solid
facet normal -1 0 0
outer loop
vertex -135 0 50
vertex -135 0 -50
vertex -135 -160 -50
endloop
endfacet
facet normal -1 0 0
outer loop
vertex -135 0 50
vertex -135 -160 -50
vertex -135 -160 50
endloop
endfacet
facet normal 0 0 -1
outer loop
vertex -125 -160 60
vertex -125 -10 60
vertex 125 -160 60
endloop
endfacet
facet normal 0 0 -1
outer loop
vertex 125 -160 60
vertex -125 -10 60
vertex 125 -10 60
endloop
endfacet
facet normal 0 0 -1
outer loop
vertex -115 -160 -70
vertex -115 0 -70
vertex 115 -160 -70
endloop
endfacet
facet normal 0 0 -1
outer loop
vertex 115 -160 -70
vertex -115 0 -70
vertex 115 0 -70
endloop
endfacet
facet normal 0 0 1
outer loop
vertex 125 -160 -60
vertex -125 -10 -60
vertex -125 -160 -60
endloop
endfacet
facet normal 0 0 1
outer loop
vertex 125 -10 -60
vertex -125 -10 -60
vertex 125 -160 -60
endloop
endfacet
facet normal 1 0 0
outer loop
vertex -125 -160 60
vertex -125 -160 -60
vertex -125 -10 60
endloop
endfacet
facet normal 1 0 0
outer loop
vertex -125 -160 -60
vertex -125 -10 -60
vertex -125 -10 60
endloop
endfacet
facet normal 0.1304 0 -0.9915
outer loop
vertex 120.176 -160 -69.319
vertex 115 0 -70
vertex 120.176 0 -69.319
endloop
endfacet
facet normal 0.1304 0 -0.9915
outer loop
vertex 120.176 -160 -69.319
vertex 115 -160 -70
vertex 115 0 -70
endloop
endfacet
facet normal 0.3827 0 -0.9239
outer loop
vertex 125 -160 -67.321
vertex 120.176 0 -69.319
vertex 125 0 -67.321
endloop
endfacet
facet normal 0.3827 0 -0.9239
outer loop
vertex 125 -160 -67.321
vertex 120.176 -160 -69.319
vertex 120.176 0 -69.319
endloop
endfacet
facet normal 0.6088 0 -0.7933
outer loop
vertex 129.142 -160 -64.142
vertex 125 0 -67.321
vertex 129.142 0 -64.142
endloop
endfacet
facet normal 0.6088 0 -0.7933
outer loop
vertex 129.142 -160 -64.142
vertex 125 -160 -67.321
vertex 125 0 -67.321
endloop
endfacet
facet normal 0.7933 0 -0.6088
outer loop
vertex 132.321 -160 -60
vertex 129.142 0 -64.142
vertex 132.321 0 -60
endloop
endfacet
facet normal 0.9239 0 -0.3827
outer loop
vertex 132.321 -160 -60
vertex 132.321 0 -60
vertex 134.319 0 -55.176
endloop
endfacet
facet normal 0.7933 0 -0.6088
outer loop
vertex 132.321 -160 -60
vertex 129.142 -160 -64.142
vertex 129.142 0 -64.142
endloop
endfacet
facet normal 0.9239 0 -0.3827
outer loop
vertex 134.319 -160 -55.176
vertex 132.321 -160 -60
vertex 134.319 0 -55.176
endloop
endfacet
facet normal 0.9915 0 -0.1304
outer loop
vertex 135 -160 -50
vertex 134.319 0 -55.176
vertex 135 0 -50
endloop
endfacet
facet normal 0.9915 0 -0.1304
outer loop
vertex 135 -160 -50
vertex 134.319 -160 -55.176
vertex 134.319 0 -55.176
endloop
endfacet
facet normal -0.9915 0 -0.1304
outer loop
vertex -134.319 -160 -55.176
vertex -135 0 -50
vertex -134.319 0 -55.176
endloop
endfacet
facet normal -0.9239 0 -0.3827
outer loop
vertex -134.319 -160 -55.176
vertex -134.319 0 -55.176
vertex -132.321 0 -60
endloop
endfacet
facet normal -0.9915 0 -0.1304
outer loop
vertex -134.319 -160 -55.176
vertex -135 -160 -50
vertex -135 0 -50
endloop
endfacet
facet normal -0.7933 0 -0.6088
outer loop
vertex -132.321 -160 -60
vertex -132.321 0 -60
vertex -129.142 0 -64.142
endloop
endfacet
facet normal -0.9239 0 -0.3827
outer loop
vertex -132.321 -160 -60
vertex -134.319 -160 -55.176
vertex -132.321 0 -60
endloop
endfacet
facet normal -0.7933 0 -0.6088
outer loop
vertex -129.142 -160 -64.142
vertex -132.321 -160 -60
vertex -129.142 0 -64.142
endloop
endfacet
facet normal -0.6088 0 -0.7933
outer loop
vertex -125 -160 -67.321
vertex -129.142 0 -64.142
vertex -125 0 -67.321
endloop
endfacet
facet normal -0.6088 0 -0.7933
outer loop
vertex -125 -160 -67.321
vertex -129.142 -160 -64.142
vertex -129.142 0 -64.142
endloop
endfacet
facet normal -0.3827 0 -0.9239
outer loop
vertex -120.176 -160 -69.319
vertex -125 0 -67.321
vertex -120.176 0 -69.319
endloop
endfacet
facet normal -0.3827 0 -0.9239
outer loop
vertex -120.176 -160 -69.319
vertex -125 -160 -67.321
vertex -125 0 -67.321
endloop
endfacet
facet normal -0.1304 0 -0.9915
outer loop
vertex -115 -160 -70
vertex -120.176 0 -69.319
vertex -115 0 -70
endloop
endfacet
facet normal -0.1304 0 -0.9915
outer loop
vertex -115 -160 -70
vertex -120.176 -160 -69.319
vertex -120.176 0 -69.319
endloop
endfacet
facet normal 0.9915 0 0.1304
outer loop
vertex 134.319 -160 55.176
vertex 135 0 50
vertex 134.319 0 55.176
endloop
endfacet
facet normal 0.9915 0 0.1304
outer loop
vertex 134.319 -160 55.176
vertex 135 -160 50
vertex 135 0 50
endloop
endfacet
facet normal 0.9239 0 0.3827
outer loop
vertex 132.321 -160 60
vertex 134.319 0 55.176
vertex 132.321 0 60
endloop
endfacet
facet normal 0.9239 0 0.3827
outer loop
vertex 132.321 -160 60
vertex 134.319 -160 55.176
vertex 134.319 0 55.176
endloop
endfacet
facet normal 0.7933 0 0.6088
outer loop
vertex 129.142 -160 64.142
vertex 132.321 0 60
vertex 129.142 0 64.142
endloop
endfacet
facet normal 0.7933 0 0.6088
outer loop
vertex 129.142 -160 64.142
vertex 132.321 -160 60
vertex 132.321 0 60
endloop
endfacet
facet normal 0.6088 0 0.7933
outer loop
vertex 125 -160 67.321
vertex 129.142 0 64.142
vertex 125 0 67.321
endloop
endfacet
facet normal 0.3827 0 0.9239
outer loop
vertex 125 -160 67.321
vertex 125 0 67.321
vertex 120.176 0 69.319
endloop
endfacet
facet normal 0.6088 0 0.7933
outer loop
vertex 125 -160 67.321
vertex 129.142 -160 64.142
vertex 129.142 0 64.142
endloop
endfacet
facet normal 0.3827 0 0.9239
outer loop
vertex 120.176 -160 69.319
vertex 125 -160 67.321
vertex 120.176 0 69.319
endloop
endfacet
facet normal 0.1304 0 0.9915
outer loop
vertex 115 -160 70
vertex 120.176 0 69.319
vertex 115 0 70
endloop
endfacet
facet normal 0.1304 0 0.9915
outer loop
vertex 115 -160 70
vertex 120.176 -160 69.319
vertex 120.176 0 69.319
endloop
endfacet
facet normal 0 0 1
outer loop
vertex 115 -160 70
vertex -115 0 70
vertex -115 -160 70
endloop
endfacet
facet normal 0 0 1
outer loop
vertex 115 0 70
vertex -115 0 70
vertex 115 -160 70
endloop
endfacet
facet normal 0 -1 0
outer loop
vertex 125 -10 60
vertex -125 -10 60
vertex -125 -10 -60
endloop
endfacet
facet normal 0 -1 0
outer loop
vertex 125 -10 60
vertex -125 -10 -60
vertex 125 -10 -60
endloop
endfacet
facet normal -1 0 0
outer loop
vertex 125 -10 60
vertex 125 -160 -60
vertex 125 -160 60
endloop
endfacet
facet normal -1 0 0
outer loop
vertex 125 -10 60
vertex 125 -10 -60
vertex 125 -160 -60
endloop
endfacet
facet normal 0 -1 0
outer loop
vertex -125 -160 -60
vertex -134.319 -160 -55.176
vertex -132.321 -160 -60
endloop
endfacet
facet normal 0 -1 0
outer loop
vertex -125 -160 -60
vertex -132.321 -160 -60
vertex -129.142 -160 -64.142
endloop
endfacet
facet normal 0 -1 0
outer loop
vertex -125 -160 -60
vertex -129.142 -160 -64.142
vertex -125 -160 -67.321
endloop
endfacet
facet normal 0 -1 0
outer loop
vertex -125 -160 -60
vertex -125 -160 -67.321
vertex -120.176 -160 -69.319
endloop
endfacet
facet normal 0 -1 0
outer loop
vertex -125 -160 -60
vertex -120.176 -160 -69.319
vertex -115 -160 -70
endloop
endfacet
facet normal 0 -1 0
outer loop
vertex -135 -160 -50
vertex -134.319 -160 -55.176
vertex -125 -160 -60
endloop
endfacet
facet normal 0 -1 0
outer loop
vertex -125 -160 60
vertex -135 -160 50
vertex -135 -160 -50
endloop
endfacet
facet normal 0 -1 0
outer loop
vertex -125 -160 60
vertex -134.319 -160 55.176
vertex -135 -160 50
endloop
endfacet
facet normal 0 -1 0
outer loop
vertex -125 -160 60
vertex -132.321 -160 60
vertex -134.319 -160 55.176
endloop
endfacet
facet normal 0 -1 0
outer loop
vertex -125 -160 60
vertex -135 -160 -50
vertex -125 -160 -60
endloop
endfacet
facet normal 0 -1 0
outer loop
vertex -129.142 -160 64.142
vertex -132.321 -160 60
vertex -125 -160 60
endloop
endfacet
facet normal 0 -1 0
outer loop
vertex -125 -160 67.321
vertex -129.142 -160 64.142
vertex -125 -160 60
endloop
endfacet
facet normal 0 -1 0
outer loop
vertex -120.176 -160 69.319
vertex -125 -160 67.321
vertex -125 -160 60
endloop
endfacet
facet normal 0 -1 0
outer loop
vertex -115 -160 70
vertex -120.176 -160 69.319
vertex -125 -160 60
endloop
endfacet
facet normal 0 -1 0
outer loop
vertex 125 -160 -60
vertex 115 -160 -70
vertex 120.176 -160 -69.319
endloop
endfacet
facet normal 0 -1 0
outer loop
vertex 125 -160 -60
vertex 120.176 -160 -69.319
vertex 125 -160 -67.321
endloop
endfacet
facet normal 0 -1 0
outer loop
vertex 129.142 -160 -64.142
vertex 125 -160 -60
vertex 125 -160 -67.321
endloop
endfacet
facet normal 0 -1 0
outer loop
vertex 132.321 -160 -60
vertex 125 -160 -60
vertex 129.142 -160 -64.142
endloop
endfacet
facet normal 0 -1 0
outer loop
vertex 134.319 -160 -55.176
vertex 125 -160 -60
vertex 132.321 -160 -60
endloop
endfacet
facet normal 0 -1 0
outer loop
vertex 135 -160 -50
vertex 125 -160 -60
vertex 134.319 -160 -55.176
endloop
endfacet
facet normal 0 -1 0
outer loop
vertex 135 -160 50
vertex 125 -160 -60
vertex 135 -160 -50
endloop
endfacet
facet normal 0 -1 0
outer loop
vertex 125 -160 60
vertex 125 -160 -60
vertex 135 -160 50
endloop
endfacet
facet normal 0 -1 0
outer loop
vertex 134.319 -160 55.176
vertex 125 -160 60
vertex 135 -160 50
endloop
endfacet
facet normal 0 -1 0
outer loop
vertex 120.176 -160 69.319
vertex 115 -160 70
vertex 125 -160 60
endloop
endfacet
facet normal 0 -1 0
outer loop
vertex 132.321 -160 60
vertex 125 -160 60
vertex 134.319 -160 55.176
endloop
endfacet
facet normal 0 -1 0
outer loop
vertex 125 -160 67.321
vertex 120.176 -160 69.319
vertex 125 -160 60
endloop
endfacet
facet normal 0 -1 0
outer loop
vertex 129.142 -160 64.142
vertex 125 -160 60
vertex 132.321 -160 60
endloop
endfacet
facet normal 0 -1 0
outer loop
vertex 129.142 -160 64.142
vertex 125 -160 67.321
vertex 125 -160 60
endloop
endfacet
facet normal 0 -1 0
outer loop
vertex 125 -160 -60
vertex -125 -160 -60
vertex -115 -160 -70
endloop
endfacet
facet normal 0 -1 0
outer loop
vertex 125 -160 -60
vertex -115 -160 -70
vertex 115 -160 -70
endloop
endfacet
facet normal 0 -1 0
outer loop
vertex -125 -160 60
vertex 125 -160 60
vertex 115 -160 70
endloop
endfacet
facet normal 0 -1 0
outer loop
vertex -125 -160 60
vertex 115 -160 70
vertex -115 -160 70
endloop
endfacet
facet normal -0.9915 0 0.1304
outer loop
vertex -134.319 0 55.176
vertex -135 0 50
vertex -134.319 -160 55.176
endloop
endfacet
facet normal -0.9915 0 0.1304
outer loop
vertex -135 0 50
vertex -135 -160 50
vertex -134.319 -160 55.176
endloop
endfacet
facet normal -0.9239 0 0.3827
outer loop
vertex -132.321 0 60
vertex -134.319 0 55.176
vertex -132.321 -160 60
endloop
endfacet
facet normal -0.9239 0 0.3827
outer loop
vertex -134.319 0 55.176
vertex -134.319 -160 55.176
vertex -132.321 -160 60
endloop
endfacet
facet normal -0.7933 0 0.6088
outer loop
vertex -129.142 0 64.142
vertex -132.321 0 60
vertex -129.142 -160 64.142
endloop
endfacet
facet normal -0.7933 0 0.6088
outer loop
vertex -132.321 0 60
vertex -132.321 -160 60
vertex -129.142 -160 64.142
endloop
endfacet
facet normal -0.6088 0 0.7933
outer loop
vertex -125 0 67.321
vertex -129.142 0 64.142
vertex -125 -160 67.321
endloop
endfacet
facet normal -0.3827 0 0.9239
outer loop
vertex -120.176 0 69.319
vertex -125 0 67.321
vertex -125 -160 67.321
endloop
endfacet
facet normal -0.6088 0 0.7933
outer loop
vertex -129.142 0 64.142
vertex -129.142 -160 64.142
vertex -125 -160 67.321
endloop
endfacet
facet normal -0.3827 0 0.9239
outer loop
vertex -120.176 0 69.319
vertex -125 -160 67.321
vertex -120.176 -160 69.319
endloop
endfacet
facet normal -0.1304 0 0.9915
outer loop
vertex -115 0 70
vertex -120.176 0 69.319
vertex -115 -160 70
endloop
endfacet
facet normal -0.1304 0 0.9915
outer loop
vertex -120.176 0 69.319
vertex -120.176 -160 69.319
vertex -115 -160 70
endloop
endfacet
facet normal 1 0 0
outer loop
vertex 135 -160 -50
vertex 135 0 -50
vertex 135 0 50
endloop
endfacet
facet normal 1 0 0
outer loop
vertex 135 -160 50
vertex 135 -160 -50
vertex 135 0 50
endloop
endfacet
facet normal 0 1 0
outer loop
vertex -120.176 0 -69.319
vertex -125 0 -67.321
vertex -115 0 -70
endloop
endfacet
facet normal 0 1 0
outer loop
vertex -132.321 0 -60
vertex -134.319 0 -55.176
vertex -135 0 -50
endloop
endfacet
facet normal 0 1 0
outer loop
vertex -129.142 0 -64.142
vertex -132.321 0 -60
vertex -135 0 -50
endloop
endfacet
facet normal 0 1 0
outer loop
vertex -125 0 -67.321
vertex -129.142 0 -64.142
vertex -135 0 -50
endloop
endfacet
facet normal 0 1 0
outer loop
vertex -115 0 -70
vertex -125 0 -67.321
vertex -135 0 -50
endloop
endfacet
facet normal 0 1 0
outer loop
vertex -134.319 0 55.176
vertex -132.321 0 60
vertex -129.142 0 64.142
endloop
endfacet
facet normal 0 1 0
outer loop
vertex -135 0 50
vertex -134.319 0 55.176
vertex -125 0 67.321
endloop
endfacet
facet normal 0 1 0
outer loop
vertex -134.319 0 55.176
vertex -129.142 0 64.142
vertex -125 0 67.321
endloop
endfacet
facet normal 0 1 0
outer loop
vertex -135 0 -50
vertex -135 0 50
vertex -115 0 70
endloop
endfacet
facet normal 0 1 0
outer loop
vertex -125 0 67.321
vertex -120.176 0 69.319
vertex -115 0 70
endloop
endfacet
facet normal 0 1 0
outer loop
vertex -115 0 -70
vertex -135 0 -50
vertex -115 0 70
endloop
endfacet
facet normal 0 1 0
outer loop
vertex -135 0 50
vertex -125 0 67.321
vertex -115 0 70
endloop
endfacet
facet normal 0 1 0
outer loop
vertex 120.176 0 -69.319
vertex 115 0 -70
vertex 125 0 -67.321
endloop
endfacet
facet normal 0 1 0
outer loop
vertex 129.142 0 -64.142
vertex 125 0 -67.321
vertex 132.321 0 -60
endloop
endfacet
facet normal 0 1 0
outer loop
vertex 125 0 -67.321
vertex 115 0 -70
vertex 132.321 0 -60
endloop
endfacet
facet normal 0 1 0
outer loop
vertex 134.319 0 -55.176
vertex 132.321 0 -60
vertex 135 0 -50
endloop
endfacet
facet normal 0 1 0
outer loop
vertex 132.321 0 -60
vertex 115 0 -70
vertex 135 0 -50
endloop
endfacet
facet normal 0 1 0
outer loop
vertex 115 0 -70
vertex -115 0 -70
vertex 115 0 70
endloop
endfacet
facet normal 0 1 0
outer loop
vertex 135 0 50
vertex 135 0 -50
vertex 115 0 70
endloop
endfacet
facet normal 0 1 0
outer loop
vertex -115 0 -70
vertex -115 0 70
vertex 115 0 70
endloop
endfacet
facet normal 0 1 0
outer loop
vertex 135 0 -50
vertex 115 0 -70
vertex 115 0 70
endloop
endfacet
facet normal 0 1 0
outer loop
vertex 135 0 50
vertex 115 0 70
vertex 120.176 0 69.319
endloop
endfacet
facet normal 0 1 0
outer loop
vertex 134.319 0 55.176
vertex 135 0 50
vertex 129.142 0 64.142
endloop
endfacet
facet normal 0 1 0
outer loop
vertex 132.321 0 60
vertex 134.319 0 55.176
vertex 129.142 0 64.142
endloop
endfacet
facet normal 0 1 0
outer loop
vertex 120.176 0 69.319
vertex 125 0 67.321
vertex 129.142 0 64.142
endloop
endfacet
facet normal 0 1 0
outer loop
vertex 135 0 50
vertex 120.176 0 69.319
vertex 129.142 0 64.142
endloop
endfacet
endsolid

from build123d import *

# Parameters (mm, degrees)
F0_W     = 270
F0_H     = 140
F1_DEPTH = 160
F2_T     = -10
F3_R     = 20


with BuildPart() as f1:
    # F0 (on Front) → F1 (new body)
    with BuildSketch(Plane.XZ):
        Rectangle(F0_W, F0_H)
    extrude(amount=F1_DEPTH)

    # F2
    f2_openings = [f1.faces().sort_by_distance(p)[0] for p in [
        (0, -160, 0),
    ]]
    offset(amount=F2_T, openings=f2_openings)

    # F3
    f3_edges = [f1.edges().sort_by_distance(p)[0] for p in [
        (-135, -80, 70),
        (135, -80, -70),
        (135, -80, 70),
        (-135, -80, -70),
    ]]
    fillet(f3_edges, radius=F3_R)


solid = f1.part
